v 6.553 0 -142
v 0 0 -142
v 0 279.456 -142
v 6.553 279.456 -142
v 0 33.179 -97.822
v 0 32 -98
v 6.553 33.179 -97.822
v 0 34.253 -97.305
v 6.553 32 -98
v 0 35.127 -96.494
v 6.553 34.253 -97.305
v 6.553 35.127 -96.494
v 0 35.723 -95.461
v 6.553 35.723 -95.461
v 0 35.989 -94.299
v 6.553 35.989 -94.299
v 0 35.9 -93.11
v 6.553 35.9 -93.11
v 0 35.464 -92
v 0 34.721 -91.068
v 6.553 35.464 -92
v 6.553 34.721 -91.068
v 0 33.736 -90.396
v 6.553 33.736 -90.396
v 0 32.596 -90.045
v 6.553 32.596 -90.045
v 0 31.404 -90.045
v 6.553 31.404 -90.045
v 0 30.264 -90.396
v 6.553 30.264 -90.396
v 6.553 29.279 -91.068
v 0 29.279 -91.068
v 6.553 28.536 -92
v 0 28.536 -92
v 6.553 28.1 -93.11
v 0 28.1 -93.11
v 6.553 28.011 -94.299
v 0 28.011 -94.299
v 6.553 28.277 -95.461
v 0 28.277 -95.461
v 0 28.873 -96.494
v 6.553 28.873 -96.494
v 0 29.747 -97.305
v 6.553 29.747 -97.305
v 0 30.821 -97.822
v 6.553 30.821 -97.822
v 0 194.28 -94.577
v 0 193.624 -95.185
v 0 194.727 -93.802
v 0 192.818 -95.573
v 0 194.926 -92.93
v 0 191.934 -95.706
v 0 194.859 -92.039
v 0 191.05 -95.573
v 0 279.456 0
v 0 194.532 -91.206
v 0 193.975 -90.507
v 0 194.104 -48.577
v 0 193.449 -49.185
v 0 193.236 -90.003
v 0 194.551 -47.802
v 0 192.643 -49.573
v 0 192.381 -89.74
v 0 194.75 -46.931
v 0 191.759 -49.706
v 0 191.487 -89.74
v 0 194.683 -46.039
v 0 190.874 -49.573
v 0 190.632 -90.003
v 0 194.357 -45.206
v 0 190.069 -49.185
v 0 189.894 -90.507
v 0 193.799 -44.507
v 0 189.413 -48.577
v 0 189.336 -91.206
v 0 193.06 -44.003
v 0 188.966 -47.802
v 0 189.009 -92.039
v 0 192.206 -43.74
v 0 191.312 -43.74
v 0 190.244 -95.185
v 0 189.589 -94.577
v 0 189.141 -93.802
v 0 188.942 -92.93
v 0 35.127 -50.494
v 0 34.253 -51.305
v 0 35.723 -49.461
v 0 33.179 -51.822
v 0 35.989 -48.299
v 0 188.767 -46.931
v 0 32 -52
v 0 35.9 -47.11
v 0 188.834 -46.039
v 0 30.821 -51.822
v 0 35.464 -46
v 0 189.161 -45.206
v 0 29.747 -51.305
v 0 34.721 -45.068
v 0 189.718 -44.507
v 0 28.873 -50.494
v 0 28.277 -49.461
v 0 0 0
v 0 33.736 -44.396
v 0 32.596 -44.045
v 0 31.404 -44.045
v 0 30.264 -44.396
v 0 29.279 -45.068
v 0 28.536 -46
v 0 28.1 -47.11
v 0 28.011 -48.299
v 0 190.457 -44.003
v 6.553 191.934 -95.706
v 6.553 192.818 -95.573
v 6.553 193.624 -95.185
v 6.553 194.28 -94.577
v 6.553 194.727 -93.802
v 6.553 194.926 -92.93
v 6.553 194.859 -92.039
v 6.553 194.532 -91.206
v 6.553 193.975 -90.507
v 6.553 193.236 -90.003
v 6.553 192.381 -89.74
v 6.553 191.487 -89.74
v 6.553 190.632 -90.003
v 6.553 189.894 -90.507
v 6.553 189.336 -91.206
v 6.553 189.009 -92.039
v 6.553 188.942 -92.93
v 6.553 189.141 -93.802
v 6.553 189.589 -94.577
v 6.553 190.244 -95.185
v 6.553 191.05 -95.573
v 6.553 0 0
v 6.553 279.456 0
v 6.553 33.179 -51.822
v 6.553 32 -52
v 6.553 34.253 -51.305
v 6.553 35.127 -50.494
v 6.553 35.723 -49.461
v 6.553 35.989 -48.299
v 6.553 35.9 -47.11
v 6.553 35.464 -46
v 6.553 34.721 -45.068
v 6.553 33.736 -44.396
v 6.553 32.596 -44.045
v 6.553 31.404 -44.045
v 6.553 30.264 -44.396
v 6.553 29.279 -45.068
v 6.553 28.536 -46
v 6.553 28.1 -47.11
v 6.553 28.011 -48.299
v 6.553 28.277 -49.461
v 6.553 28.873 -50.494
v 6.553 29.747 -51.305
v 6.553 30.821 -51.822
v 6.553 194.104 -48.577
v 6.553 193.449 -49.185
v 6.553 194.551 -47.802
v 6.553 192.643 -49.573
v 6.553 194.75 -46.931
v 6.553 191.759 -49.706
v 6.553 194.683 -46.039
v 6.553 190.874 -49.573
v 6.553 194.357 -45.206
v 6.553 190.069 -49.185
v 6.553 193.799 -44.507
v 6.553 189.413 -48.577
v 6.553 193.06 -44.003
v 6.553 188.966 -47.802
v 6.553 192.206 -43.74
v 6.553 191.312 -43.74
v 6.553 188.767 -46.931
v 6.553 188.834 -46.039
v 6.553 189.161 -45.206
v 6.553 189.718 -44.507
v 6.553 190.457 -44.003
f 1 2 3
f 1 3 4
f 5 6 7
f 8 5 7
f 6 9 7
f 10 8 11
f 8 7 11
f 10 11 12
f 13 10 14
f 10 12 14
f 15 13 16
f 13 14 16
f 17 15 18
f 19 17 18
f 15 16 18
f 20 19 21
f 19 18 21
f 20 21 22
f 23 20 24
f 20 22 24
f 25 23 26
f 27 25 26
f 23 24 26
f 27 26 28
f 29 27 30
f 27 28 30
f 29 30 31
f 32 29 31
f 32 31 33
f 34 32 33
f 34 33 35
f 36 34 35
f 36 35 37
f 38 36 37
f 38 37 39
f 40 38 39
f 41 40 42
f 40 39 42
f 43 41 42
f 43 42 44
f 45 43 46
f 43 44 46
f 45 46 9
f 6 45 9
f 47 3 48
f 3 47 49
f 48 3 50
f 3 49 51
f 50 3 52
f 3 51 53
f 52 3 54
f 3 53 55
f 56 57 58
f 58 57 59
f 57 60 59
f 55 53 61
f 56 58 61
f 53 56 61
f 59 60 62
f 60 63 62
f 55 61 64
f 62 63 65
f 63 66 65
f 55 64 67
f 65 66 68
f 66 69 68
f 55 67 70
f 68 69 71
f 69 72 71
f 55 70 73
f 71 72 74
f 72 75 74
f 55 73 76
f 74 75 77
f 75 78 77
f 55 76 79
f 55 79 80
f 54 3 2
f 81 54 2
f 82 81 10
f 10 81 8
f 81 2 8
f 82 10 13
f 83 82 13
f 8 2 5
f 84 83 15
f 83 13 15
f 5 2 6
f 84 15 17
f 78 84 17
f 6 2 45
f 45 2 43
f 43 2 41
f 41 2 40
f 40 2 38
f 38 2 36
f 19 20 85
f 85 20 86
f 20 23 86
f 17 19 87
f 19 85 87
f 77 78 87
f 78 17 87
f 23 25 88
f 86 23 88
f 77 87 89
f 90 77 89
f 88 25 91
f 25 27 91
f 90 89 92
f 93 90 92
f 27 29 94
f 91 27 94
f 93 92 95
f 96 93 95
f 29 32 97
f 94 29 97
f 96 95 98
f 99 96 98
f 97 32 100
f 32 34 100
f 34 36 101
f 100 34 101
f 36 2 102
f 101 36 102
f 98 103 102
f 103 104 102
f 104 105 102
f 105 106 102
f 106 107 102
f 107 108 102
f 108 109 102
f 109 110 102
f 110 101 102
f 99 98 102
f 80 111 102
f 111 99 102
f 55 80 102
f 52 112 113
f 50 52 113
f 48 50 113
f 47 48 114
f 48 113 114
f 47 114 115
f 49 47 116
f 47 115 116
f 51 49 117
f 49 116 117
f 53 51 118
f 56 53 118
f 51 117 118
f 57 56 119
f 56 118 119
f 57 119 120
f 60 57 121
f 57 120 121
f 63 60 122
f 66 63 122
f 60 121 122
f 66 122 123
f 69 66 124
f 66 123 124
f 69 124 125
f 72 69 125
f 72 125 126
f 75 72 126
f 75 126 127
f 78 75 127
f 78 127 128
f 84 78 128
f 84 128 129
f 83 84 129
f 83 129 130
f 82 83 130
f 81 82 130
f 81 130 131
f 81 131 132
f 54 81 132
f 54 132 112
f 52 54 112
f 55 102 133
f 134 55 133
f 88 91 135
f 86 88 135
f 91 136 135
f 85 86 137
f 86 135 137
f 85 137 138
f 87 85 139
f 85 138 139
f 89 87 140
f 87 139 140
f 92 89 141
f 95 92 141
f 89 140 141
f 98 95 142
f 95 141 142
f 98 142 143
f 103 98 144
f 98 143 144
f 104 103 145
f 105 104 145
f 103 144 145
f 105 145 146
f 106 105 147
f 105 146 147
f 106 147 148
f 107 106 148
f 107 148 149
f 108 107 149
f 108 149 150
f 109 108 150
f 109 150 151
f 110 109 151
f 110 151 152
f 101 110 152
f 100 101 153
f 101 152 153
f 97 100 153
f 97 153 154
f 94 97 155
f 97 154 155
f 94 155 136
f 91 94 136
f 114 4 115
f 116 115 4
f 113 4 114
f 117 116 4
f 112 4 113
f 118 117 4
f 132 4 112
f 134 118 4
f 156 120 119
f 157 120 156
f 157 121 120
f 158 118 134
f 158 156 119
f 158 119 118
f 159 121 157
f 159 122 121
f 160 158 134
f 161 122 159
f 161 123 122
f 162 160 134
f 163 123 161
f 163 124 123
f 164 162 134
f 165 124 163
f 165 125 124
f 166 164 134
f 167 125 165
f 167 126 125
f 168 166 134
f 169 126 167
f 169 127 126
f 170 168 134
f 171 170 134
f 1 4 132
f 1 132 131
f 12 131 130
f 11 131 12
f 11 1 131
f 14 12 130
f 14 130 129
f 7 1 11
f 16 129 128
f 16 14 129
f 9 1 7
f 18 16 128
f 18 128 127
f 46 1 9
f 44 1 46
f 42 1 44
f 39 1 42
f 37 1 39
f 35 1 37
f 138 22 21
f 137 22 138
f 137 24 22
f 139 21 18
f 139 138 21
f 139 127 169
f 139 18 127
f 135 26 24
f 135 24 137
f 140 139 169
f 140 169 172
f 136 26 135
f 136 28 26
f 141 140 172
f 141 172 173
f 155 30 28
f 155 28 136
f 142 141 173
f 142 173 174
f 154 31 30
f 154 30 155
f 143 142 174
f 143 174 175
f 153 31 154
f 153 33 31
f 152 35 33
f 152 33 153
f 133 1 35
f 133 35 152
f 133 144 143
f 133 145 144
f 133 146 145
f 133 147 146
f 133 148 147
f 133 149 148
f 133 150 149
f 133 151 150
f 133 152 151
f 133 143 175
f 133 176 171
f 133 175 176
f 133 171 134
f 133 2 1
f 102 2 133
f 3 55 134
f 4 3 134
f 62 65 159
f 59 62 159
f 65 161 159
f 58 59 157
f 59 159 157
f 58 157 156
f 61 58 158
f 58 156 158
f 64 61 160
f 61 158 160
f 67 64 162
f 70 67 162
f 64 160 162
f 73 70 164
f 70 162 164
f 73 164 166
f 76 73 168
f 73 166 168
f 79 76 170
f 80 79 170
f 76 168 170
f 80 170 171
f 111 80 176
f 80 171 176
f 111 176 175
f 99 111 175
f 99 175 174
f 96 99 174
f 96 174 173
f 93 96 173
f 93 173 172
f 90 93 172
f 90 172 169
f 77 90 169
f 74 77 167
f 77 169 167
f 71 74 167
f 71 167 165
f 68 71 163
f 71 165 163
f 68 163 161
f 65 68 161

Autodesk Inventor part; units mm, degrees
ref_plane "YZ Plane" through (0, 0, 0) normal (1, 0, 0) x (0, 1, 0)
ref_plane "XZ Plane" through (0, 0, 0) normal (0, 1, 0) x (-1, 0, 0)
ref_plane "XY Plane" through (0, 0, 0) normal (0, 0, 1) x (1, 0, 0)
sketch "Sketch1" plane through (0, 0, 0) normal (1, 0, 0) x (0, 1, 0)
  line L0 (0, 0) -> (212.4, 0)
  line L1 (212.4, 0) -> (212.4, -142)
  line L2 (212.4, -142) -> (0, -142)
  line L3 (0, -142) -> (0, 0)
  dimension "d0" = 212.4
  dimension "d1" = 142
extrude "Extrusion1" add sketch "Sketch1" along normal blind 6.5532
sketch "Sketch2" plane through (6.5532, 0, 0) normal (1, 0, 0) x (0, 0, -1)
  line L0 (0, 0) -> (142, 0) construction
  line L1 (48, 32) -> (94, 32) construction
  circle A0 centre (48, 32) radius 4
  circle A1 centre (94, 32) radius 4
  point P0 (71, 0)
  point P1 (71, 32)
  point P2 (71, 0)
  point P3 (71, 0)
  dimension "d9" = 8
  dimension "d10" = 46
  dimension "d11" = 32
extrude "Extrusion2" cut sketch "Sketch2" against normal blind 7.62
sketch "Sketch3" plane through (0, 212.4, 0) normal (0, 1, 0) x (1, 0, 0)
  line L0 (0, 142) -> (0, 0) projected
  line L1 (0, 0) -> (6.5532, 0) projected
  line L2 (6.5532, 142) -> (6.5532, 0) projected
  line L3 (0, 142) -> (6.5532, 142) projected
  point P0 (0, 0)
extrude "Extrusion3" add sketch "Sketch3" along normal blind 67.056
sketch "Sketch4" plane through (6.5532, 0, 0) normal (1, 0, 0) x (0, 0, -1)
  circle A0 centre (92.7061, 191.9341) radius 3 projected
  circle A1 centre (46.7064, 191.7587) radius 3 projected
  point P0 (0, 0)
extrude "Extrusion4" cut sketch "Sketch4" against normal blind 25.4
properties part number "Z_Gantry_Plate" material "Steel, Mild"
